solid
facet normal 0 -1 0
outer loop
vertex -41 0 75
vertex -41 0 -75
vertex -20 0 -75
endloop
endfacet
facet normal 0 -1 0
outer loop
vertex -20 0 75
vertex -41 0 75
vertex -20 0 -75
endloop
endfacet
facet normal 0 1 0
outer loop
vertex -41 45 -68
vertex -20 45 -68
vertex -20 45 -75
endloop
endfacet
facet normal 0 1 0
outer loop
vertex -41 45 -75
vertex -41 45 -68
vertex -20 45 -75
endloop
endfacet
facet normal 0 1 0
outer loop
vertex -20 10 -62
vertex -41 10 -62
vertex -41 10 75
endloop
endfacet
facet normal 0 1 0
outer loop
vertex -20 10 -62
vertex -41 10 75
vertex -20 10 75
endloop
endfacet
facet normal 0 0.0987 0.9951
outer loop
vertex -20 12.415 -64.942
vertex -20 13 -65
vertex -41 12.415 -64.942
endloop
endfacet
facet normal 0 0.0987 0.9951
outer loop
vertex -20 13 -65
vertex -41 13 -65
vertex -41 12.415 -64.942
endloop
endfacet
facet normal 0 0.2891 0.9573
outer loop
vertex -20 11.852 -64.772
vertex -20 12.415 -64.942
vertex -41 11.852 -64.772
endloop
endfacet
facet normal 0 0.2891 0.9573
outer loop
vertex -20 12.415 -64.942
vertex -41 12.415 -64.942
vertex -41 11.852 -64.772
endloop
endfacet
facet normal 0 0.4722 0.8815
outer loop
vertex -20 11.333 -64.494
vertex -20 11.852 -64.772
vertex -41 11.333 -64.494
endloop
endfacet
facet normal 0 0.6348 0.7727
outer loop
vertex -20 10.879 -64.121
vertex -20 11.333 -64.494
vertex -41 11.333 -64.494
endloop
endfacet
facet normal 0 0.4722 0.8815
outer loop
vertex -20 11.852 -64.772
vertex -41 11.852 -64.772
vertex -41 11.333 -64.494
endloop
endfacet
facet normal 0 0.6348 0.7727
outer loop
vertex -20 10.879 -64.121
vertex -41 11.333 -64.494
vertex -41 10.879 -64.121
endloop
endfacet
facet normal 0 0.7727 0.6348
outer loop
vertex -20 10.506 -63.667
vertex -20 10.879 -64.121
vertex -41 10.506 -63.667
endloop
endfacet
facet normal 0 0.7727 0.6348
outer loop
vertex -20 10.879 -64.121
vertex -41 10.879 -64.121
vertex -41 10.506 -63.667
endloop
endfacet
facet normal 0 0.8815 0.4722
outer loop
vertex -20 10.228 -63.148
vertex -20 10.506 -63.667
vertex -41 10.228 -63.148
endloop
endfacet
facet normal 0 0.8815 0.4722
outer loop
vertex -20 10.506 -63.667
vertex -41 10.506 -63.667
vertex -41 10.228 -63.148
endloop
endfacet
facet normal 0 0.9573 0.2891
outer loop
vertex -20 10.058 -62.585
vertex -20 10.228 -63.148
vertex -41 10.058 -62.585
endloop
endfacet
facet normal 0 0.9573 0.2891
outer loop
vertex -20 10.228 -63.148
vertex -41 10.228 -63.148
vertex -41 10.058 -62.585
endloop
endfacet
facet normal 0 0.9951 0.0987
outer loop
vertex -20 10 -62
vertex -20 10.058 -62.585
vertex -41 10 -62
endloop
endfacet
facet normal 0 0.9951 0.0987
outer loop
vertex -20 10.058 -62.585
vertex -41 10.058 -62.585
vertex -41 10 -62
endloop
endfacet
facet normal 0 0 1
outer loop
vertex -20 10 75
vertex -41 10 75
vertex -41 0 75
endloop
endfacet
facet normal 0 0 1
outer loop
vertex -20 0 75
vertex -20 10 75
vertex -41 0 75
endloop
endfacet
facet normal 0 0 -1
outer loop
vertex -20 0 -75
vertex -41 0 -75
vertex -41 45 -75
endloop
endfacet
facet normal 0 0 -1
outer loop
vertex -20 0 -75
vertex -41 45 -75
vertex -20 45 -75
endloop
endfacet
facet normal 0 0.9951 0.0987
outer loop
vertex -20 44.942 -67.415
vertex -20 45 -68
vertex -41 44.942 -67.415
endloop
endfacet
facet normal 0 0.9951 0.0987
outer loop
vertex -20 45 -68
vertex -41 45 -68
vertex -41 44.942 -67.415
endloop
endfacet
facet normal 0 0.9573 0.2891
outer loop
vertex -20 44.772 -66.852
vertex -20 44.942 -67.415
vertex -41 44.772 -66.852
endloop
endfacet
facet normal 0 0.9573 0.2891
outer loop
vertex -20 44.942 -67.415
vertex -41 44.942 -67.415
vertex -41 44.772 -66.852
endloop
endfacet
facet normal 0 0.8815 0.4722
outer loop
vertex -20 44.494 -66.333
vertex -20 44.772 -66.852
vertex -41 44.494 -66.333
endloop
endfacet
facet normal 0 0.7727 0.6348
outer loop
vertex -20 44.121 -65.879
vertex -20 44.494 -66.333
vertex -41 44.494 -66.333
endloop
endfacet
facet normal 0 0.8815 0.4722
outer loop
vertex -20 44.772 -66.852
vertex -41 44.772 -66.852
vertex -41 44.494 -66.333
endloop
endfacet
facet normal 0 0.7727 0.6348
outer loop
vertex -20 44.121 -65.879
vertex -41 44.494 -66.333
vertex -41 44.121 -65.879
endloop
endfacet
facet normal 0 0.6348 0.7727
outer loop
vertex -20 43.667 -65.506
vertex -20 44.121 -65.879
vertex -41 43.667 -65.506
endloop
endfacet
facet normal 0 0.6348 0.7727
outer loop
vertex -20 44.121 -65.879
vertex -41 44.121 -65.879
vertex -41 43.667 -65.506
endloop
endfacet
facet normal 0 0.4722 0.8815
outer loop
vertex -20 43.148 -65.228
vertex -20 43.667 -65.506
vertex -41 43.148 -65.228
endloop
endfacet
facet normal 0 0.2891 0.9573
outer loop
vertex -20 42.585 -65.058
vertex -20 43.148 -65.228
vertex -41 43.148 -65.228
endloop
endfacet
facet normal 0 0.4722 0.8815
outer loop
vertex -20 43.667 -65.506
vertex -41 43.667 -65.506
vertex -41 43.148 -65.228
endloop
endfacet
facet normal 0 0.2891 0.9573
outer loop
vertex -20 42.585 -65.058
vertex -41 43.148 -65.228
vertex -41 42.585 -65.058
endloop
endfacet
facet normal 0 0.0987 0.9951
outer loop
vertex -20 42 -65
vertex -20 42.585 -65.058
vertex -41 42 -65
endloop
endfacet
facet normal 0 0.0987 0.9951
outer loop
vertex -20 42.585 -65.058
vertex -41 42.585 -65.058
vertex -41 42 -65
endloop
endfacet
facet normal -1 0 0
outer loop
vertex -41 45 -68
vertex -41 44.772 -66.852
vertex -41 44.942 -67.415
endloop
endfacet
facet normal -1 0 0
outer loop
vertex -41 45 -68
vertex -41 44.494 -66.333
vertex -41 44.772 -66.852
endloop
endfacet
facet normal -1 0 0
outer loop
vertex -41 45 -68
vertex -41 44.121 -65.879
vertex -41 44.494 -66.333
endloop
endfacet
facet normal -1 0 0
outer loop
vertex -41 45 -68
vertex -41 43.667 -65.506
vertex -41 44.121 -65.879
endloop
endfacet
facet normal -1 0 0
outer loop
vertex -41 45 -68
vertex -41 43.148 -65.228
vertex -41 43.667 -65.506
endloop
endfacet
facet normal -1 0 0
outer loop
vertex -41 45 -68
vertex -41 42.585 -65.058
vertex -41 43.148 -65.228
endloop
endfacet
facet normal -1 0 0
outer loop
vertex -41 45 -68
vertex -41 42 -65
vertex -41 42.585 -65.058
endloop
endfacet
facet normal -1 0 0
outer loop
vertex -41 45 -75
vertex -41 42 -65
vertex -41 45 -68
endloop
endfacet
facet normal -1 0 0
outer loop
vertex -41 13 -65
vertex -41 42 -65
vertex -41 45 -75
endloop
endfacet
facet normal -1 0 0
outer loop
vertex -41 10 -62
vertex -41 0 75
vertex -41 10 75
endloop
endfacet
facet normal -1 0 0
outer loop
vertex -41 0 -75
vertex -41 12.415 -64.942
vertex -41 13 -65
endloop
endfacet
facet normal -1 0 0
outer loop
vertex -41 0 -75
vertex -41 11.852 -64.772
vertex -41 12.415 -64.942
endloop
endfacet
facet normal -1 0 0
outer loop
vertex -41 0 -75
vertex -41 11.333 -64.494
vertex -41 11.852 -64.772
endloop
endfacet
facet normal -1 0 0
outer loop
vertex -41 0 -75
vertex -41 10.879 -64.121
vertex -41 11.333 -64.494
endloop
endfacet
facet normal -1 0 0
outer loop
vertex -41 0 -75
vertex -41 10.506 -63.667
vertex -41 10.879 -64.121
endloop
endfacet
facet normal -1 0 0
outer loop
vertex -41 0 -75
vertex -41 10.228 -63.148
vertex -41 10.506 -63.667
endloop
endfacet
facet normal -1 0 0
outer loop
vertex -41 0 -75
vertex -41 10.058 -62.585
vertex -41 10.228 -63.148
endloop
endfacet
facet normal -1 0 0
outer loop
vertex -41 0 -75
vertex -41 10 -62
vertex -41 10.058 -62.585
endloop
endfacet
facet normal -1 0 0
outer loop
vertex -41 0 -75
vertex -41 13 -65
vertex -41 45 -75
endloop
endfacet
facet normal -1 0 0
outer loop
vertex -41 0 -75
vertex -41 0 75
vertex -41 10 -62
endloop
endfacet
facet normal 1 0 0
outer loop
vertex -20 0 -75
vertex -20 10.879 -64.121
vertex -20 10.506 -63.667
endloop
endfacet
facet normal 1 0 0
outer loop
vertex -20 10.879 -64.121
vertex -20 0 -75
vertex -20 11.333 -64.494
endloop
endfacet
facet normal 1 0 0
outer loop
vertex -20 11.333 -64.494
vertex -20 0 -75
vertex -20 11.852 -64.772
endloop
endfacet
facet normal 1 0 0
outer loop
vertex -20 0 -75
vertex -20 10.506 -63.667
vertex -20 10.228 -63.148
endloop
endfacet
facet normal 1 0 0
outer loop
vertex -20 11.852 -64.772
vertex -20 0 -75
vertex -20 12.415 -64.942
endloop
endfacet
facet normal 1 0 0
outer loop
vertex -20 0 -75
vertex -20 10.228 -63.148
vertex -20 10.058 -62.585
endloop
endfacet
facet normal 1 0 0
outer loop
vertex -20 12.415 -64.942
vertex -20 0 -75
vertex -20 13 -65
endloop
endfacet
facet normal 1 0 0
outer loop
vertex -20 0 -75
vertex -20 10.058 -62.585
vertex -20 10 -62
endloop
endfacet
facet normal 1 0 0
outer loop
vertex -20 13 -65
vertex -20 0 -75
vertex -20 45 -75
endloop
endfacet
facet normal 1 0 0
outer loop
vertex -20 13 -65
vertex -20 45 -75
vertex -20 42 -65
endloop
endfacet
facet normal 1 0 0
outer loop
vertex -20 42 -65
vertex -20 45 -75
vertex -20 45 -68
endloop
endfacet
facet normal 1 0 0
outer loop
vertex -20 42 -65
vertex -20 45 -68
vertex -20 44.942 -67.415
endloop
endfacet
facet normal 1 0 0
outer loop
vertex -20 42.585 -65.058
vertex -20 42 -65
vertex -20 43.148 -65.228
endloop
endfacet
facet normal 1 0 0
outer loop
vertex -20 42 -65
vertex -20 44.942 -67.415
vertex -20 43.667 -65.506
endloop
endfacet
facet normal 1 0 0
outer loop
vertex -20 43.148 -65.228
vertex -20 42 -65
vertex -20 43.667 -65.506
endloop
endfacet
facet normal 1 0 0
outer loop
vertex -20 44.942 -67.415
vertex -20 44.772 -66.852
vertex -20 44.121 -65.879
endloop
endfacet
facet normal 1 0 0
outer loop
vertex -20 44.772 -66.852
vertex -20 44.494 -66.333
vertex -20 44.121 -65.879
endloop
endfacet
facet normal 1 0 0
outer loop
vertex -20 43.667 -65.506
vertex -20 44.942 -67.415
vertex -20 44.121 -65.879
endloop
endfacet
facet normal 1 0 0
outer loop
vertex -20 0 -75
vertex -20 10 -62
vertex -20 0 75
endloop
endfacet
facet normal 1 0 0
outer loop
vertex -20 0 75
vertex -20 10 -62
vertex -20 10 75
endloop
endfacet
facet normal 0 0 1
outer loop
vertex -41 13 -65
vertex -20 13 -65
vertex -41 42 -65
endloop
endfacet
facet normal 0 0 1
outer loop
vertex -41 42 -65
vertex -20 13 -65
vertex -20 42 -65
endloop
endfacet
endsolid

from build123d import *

# Parameters (mm, degrees)
SKETCH1_W                = 82
SKETCH1_H                = 150
BOSS_EXTRUDE1_DEPTH      = 10
SKETCH2_W                = 10
SKETCH2_H                = 45
BOSS_EXTRUDE2_DEPTH      = 82
BOSS_EXTRUDE3_DEPTH      = 42
BOSS_EXTRUDE3_DEPTH_BACK = 10
FILLET3_RADIUS           = 26
FILLET3_LENGTH           = 10
FILLET4_RADIUS           = 26
FILLET4_LENGTH           = 10
BOSS_EXTRUDE4_DEPTH      = 10
BOSS_EXTRUDE5_DEPTH      = 10
FILLET5_R                = 15
FILLET6_R                = 15
SKETCH6_R                = 8
SKETCH6_R_2              = 5.5
CUT_EXTRUDE1_DEPTH       = 131.057679512
FILLET7_R                = 3
FILLET8_R                = 3
FILLET9_R                = 3
FILLET10_R               = 3
FILLET11_R               = 2
SKETCH7_R                = 5.5
CUT_EXTRUDE2_DEPTH       = 116.043470045
SKETCH8_W                = 182.93165677
SKETCH8_H                = 103.574339271
CUT_EXTRUDE3_DEPTH       = 131.057679512
SKETCH9_W                = 12.711196948
SKETCH9_H                = 88.540061501
BOSS_EXTRUDE6_DEPTH      = 10


with BuildPart() as part:
    # Sketch1 → Boss-Extrude1 (new body)
    with BuildSketch(Plane(origin=(0, 0, 0), x_dir=(1, 0, 0), z_dir=(0, 1, 0))):
        Rectangle(SKETCH1_W, SKETCH1_H)
    extrude(amount=BOSS_EXTRUDE1_DEPTH)

    # Sketch2 → Boss-Extrude2 (add, through all)
    with BuildSketch(Plane(origin=(41, 0, 0), x_dir=(0, 0, -1), z_dir=(1, 0, 0))):
        with Locations((70, 22.5)):
            Rectangle(SKETCH2_W, SKETCH2_H)
    extrude(amount=-BOSS_EXTRUDE2_DEPTH)

    # Sketch3 → Boss-Extrude3 (add, two sides: drawn at the far end of the back side and taken through both)
    with BuildSketch(Plane.XY.offset(-65).offset(-BOSS_EXTRUDE3_DEPTH_BACK)):
        Polygon((10, 45), (10, 10), (20, 10), (20, 45), (20, 87), (10, 87), align=None)
        Polygon((-10, 45), (-10, 87), (-20, 87), (-20, 45), (-20, 10), (-10, 10), align=None)
    extrude(amount=BOSS_EXTRUDE3_DEPTH + BOSS_EXTRUDE3_DEPTH_BACK)

    # Fillet3: full round fillet: the end face becomes a half cylinder, R = half its width
    fillet3_face = Plane((15, 87, -49), x_dir=(-1, 0, 0), z_dir=(0, 1, 0))  # on the end face: x along it, z out of the body
    fillet3_slab = fillet3_face.offset(-FILLET3_RADIUS / 2) * Box(FILLET3_LENGTH, 2 * FILLET3_RADIUS, FILLET3_RADIUS, mode=Mode.PRIVATE)  # the body's end, R deep
    fillet3_round = Plane((15, 61, -49), x_dir=(0, 1, 0), z_dir=(-1, 0, 0)) * Cylinder(FILLET3_RADIUS, FILLET3_LENGTH, mode=Mode.PRIVATE)  # its axis R under the face
    add(fillet3_slab - fillet3_round, mode=Mode.SUBTRACT)

    # Fillet4: full round fillet: the end face becomes a half cylinder, R = half its width
    fillet4_face = Plane((-15, 87, -49), x_dir=(-1, 0, 0), z_dir=(0, 1, 0))  # on the end face: x along it, z out of the body
    fillet4_slab = fillet4_face.offset(-FILLET4_RADIUS / 2) * Box(FILLET4_LENGTH, 2 * FILLET4_RADIUS, FILLET4_RADIUS, mode=Mode.PRIVATE)  # the body's end, R deep
    fillet4_round = Plane((-15, 61, -49), x_dir=(0, 1, 0), z_dir=(-1, 0, 0)) * Cylinder(FILLET4_RADIUS, FILLET4_LENGTH, mode=Mode.PRIVATE)  # its axis R under the face
    add(fillet4_slab - fillet4_round, mode=Mode.SUBTRACT)

    # Sketch4 → Boss-Extrude4 (add)
    with BuildSketch(Plane(origin=(20, 0, 0), x_dir=(0, 0, -1), z_dir=(1, 0, 0))):
        Polygon((23, 10), (23, 50), (-75, 25), (-75, 10), align=None)
    extrude(amount=-BOSS_EXTRUDE4_DEPTH)

    # Sketch5 → Boss-Extrude5 (add)
    with BuildSketch(Plane.ZY.offset(20)):
        Polygon((-23, 50), (75, 25), (75, 10), (-23, 10), align=None)
    extrude(amount=-BOSS_EXTRUDE5_DEPTH)

    # Fillet5
    fillet5_edges = [part.edges().sort_by_distance(p)[0] for p in [
        (15, 25, 75),
    ]]
    fillet(fillet5_edges, radius=FILLET5_R)

    # Fillet6
    fillet6_edges = [part.edges().sort_by_distance(p)[0] for p in [
        (-15, 25, 75),
    ]]
    fillet(fillet6_edges, radius=FILLET6_R)

    # Sketch6 → Cut-Extrude1 (cut, through all)
    with BuildSketch(Plane(origin=(20, 0, 0), x_dir=(0, 0, -1), z_dir=(1, 0, 0))):
        with Locations((49, 61)):
            Circle(SKETCH6_R)
        with Locations((-60, 17.5)):
            Circle(SKETCH6_R_2)
    extrude(amount=-CUT_EXTRUDE1_DEPTH, mode=Mode.SUBTRACT)

    # Fillet7
    fillet7_edges = [part.edges().sort_by_distance(p)[0] for p in [
        (30.5, 45, -65),
    ]]
    fillet(fillet7_edges, radius=FILLET7_R)

    # Fillet8
    fillet8_edges = [part.edges().sort_by_distance(p)[0] for p in [
        (0, 45, -65),
    ]]
    fillet(fillet8_edges, radius=FILLET8_R)

    # Fillet9
    fillet9_edges = [part.edges().sort_by_distance(p)[0] for p in [
        (-30.5, 45, -65),
    ]]
    fillet(fillet9_edges, radius=FILLET9_R)

    # Fillet10
    fillet10_edges = [part.edges().sort_by_distance(p)[0] for p in [
        (30.5, 10, -65),
        (0, 10, -65),
        (-30.5, 10, -65),
    ]]
    fillet(fillet10_edges, radius=FILLET10_R)

    # Fillet11
    fillet11_edges = [part.edges().sort_by_distance(p)[0] for p in [
        (15, 50, -23),
        (-15, 50, -23),
    ]]
    fillet(fillet11_edges, radius=FILLET11_R)

    # Sketch7 → Cut-Extrude2 (cut, through all)
    with BuildSketch(Plane(origin=(0, 10, 0), x_dir=(1, 0, 0), z_dir=(0, 1, 0))):
        with Locations(Location((31.5, 45, 0), (0, 0, 270))):
            Circle(SKETCH7_R)
        with Locations(Location((31.5, -15, 0), (0, 0, 270))):
            Circle(SKETCH7_R)
        with Locations(Location((-31.5, -15, 0), (0, 0, 90))):
            Circle(SKETCH7_R)
        with Locations(Location((-31.5, 45, 0), (0, 0, 90))):
            Circle(SKETCH7_R)
    extrude(amount=-CUT_EXTRUDE2_DEPTH, mode=Mode.SUBTRACT)

    # Sketch8 → Cut-Extrude3 (cut, through all)
    with BuildSketch(Plane.ZY.offset(20)):
        with Locations((0.186284783, 47.287847829)):
            Rectangle(SKETCH8_W, SKETCH8_H)
    extrude(amount=-CUT_EXTRUDE3_DEPTH, mode=Mode.SUBTRACT)

    # Sketch9 → Boss-Extrude6 (add, through all)
    with BuildSketch(Plane(origin=(0, 10, 0), x_dir=(1, 0, 0), z_dir=(0, 1, 0))):
        with Locations((-31.157475704, 8.108867018)):
            Rectangle(SKETCH9_W, SKETCH9_H)
    extrude(amount=-BOSS_EXTRUDE6_DEPTH)


solid = part.part
